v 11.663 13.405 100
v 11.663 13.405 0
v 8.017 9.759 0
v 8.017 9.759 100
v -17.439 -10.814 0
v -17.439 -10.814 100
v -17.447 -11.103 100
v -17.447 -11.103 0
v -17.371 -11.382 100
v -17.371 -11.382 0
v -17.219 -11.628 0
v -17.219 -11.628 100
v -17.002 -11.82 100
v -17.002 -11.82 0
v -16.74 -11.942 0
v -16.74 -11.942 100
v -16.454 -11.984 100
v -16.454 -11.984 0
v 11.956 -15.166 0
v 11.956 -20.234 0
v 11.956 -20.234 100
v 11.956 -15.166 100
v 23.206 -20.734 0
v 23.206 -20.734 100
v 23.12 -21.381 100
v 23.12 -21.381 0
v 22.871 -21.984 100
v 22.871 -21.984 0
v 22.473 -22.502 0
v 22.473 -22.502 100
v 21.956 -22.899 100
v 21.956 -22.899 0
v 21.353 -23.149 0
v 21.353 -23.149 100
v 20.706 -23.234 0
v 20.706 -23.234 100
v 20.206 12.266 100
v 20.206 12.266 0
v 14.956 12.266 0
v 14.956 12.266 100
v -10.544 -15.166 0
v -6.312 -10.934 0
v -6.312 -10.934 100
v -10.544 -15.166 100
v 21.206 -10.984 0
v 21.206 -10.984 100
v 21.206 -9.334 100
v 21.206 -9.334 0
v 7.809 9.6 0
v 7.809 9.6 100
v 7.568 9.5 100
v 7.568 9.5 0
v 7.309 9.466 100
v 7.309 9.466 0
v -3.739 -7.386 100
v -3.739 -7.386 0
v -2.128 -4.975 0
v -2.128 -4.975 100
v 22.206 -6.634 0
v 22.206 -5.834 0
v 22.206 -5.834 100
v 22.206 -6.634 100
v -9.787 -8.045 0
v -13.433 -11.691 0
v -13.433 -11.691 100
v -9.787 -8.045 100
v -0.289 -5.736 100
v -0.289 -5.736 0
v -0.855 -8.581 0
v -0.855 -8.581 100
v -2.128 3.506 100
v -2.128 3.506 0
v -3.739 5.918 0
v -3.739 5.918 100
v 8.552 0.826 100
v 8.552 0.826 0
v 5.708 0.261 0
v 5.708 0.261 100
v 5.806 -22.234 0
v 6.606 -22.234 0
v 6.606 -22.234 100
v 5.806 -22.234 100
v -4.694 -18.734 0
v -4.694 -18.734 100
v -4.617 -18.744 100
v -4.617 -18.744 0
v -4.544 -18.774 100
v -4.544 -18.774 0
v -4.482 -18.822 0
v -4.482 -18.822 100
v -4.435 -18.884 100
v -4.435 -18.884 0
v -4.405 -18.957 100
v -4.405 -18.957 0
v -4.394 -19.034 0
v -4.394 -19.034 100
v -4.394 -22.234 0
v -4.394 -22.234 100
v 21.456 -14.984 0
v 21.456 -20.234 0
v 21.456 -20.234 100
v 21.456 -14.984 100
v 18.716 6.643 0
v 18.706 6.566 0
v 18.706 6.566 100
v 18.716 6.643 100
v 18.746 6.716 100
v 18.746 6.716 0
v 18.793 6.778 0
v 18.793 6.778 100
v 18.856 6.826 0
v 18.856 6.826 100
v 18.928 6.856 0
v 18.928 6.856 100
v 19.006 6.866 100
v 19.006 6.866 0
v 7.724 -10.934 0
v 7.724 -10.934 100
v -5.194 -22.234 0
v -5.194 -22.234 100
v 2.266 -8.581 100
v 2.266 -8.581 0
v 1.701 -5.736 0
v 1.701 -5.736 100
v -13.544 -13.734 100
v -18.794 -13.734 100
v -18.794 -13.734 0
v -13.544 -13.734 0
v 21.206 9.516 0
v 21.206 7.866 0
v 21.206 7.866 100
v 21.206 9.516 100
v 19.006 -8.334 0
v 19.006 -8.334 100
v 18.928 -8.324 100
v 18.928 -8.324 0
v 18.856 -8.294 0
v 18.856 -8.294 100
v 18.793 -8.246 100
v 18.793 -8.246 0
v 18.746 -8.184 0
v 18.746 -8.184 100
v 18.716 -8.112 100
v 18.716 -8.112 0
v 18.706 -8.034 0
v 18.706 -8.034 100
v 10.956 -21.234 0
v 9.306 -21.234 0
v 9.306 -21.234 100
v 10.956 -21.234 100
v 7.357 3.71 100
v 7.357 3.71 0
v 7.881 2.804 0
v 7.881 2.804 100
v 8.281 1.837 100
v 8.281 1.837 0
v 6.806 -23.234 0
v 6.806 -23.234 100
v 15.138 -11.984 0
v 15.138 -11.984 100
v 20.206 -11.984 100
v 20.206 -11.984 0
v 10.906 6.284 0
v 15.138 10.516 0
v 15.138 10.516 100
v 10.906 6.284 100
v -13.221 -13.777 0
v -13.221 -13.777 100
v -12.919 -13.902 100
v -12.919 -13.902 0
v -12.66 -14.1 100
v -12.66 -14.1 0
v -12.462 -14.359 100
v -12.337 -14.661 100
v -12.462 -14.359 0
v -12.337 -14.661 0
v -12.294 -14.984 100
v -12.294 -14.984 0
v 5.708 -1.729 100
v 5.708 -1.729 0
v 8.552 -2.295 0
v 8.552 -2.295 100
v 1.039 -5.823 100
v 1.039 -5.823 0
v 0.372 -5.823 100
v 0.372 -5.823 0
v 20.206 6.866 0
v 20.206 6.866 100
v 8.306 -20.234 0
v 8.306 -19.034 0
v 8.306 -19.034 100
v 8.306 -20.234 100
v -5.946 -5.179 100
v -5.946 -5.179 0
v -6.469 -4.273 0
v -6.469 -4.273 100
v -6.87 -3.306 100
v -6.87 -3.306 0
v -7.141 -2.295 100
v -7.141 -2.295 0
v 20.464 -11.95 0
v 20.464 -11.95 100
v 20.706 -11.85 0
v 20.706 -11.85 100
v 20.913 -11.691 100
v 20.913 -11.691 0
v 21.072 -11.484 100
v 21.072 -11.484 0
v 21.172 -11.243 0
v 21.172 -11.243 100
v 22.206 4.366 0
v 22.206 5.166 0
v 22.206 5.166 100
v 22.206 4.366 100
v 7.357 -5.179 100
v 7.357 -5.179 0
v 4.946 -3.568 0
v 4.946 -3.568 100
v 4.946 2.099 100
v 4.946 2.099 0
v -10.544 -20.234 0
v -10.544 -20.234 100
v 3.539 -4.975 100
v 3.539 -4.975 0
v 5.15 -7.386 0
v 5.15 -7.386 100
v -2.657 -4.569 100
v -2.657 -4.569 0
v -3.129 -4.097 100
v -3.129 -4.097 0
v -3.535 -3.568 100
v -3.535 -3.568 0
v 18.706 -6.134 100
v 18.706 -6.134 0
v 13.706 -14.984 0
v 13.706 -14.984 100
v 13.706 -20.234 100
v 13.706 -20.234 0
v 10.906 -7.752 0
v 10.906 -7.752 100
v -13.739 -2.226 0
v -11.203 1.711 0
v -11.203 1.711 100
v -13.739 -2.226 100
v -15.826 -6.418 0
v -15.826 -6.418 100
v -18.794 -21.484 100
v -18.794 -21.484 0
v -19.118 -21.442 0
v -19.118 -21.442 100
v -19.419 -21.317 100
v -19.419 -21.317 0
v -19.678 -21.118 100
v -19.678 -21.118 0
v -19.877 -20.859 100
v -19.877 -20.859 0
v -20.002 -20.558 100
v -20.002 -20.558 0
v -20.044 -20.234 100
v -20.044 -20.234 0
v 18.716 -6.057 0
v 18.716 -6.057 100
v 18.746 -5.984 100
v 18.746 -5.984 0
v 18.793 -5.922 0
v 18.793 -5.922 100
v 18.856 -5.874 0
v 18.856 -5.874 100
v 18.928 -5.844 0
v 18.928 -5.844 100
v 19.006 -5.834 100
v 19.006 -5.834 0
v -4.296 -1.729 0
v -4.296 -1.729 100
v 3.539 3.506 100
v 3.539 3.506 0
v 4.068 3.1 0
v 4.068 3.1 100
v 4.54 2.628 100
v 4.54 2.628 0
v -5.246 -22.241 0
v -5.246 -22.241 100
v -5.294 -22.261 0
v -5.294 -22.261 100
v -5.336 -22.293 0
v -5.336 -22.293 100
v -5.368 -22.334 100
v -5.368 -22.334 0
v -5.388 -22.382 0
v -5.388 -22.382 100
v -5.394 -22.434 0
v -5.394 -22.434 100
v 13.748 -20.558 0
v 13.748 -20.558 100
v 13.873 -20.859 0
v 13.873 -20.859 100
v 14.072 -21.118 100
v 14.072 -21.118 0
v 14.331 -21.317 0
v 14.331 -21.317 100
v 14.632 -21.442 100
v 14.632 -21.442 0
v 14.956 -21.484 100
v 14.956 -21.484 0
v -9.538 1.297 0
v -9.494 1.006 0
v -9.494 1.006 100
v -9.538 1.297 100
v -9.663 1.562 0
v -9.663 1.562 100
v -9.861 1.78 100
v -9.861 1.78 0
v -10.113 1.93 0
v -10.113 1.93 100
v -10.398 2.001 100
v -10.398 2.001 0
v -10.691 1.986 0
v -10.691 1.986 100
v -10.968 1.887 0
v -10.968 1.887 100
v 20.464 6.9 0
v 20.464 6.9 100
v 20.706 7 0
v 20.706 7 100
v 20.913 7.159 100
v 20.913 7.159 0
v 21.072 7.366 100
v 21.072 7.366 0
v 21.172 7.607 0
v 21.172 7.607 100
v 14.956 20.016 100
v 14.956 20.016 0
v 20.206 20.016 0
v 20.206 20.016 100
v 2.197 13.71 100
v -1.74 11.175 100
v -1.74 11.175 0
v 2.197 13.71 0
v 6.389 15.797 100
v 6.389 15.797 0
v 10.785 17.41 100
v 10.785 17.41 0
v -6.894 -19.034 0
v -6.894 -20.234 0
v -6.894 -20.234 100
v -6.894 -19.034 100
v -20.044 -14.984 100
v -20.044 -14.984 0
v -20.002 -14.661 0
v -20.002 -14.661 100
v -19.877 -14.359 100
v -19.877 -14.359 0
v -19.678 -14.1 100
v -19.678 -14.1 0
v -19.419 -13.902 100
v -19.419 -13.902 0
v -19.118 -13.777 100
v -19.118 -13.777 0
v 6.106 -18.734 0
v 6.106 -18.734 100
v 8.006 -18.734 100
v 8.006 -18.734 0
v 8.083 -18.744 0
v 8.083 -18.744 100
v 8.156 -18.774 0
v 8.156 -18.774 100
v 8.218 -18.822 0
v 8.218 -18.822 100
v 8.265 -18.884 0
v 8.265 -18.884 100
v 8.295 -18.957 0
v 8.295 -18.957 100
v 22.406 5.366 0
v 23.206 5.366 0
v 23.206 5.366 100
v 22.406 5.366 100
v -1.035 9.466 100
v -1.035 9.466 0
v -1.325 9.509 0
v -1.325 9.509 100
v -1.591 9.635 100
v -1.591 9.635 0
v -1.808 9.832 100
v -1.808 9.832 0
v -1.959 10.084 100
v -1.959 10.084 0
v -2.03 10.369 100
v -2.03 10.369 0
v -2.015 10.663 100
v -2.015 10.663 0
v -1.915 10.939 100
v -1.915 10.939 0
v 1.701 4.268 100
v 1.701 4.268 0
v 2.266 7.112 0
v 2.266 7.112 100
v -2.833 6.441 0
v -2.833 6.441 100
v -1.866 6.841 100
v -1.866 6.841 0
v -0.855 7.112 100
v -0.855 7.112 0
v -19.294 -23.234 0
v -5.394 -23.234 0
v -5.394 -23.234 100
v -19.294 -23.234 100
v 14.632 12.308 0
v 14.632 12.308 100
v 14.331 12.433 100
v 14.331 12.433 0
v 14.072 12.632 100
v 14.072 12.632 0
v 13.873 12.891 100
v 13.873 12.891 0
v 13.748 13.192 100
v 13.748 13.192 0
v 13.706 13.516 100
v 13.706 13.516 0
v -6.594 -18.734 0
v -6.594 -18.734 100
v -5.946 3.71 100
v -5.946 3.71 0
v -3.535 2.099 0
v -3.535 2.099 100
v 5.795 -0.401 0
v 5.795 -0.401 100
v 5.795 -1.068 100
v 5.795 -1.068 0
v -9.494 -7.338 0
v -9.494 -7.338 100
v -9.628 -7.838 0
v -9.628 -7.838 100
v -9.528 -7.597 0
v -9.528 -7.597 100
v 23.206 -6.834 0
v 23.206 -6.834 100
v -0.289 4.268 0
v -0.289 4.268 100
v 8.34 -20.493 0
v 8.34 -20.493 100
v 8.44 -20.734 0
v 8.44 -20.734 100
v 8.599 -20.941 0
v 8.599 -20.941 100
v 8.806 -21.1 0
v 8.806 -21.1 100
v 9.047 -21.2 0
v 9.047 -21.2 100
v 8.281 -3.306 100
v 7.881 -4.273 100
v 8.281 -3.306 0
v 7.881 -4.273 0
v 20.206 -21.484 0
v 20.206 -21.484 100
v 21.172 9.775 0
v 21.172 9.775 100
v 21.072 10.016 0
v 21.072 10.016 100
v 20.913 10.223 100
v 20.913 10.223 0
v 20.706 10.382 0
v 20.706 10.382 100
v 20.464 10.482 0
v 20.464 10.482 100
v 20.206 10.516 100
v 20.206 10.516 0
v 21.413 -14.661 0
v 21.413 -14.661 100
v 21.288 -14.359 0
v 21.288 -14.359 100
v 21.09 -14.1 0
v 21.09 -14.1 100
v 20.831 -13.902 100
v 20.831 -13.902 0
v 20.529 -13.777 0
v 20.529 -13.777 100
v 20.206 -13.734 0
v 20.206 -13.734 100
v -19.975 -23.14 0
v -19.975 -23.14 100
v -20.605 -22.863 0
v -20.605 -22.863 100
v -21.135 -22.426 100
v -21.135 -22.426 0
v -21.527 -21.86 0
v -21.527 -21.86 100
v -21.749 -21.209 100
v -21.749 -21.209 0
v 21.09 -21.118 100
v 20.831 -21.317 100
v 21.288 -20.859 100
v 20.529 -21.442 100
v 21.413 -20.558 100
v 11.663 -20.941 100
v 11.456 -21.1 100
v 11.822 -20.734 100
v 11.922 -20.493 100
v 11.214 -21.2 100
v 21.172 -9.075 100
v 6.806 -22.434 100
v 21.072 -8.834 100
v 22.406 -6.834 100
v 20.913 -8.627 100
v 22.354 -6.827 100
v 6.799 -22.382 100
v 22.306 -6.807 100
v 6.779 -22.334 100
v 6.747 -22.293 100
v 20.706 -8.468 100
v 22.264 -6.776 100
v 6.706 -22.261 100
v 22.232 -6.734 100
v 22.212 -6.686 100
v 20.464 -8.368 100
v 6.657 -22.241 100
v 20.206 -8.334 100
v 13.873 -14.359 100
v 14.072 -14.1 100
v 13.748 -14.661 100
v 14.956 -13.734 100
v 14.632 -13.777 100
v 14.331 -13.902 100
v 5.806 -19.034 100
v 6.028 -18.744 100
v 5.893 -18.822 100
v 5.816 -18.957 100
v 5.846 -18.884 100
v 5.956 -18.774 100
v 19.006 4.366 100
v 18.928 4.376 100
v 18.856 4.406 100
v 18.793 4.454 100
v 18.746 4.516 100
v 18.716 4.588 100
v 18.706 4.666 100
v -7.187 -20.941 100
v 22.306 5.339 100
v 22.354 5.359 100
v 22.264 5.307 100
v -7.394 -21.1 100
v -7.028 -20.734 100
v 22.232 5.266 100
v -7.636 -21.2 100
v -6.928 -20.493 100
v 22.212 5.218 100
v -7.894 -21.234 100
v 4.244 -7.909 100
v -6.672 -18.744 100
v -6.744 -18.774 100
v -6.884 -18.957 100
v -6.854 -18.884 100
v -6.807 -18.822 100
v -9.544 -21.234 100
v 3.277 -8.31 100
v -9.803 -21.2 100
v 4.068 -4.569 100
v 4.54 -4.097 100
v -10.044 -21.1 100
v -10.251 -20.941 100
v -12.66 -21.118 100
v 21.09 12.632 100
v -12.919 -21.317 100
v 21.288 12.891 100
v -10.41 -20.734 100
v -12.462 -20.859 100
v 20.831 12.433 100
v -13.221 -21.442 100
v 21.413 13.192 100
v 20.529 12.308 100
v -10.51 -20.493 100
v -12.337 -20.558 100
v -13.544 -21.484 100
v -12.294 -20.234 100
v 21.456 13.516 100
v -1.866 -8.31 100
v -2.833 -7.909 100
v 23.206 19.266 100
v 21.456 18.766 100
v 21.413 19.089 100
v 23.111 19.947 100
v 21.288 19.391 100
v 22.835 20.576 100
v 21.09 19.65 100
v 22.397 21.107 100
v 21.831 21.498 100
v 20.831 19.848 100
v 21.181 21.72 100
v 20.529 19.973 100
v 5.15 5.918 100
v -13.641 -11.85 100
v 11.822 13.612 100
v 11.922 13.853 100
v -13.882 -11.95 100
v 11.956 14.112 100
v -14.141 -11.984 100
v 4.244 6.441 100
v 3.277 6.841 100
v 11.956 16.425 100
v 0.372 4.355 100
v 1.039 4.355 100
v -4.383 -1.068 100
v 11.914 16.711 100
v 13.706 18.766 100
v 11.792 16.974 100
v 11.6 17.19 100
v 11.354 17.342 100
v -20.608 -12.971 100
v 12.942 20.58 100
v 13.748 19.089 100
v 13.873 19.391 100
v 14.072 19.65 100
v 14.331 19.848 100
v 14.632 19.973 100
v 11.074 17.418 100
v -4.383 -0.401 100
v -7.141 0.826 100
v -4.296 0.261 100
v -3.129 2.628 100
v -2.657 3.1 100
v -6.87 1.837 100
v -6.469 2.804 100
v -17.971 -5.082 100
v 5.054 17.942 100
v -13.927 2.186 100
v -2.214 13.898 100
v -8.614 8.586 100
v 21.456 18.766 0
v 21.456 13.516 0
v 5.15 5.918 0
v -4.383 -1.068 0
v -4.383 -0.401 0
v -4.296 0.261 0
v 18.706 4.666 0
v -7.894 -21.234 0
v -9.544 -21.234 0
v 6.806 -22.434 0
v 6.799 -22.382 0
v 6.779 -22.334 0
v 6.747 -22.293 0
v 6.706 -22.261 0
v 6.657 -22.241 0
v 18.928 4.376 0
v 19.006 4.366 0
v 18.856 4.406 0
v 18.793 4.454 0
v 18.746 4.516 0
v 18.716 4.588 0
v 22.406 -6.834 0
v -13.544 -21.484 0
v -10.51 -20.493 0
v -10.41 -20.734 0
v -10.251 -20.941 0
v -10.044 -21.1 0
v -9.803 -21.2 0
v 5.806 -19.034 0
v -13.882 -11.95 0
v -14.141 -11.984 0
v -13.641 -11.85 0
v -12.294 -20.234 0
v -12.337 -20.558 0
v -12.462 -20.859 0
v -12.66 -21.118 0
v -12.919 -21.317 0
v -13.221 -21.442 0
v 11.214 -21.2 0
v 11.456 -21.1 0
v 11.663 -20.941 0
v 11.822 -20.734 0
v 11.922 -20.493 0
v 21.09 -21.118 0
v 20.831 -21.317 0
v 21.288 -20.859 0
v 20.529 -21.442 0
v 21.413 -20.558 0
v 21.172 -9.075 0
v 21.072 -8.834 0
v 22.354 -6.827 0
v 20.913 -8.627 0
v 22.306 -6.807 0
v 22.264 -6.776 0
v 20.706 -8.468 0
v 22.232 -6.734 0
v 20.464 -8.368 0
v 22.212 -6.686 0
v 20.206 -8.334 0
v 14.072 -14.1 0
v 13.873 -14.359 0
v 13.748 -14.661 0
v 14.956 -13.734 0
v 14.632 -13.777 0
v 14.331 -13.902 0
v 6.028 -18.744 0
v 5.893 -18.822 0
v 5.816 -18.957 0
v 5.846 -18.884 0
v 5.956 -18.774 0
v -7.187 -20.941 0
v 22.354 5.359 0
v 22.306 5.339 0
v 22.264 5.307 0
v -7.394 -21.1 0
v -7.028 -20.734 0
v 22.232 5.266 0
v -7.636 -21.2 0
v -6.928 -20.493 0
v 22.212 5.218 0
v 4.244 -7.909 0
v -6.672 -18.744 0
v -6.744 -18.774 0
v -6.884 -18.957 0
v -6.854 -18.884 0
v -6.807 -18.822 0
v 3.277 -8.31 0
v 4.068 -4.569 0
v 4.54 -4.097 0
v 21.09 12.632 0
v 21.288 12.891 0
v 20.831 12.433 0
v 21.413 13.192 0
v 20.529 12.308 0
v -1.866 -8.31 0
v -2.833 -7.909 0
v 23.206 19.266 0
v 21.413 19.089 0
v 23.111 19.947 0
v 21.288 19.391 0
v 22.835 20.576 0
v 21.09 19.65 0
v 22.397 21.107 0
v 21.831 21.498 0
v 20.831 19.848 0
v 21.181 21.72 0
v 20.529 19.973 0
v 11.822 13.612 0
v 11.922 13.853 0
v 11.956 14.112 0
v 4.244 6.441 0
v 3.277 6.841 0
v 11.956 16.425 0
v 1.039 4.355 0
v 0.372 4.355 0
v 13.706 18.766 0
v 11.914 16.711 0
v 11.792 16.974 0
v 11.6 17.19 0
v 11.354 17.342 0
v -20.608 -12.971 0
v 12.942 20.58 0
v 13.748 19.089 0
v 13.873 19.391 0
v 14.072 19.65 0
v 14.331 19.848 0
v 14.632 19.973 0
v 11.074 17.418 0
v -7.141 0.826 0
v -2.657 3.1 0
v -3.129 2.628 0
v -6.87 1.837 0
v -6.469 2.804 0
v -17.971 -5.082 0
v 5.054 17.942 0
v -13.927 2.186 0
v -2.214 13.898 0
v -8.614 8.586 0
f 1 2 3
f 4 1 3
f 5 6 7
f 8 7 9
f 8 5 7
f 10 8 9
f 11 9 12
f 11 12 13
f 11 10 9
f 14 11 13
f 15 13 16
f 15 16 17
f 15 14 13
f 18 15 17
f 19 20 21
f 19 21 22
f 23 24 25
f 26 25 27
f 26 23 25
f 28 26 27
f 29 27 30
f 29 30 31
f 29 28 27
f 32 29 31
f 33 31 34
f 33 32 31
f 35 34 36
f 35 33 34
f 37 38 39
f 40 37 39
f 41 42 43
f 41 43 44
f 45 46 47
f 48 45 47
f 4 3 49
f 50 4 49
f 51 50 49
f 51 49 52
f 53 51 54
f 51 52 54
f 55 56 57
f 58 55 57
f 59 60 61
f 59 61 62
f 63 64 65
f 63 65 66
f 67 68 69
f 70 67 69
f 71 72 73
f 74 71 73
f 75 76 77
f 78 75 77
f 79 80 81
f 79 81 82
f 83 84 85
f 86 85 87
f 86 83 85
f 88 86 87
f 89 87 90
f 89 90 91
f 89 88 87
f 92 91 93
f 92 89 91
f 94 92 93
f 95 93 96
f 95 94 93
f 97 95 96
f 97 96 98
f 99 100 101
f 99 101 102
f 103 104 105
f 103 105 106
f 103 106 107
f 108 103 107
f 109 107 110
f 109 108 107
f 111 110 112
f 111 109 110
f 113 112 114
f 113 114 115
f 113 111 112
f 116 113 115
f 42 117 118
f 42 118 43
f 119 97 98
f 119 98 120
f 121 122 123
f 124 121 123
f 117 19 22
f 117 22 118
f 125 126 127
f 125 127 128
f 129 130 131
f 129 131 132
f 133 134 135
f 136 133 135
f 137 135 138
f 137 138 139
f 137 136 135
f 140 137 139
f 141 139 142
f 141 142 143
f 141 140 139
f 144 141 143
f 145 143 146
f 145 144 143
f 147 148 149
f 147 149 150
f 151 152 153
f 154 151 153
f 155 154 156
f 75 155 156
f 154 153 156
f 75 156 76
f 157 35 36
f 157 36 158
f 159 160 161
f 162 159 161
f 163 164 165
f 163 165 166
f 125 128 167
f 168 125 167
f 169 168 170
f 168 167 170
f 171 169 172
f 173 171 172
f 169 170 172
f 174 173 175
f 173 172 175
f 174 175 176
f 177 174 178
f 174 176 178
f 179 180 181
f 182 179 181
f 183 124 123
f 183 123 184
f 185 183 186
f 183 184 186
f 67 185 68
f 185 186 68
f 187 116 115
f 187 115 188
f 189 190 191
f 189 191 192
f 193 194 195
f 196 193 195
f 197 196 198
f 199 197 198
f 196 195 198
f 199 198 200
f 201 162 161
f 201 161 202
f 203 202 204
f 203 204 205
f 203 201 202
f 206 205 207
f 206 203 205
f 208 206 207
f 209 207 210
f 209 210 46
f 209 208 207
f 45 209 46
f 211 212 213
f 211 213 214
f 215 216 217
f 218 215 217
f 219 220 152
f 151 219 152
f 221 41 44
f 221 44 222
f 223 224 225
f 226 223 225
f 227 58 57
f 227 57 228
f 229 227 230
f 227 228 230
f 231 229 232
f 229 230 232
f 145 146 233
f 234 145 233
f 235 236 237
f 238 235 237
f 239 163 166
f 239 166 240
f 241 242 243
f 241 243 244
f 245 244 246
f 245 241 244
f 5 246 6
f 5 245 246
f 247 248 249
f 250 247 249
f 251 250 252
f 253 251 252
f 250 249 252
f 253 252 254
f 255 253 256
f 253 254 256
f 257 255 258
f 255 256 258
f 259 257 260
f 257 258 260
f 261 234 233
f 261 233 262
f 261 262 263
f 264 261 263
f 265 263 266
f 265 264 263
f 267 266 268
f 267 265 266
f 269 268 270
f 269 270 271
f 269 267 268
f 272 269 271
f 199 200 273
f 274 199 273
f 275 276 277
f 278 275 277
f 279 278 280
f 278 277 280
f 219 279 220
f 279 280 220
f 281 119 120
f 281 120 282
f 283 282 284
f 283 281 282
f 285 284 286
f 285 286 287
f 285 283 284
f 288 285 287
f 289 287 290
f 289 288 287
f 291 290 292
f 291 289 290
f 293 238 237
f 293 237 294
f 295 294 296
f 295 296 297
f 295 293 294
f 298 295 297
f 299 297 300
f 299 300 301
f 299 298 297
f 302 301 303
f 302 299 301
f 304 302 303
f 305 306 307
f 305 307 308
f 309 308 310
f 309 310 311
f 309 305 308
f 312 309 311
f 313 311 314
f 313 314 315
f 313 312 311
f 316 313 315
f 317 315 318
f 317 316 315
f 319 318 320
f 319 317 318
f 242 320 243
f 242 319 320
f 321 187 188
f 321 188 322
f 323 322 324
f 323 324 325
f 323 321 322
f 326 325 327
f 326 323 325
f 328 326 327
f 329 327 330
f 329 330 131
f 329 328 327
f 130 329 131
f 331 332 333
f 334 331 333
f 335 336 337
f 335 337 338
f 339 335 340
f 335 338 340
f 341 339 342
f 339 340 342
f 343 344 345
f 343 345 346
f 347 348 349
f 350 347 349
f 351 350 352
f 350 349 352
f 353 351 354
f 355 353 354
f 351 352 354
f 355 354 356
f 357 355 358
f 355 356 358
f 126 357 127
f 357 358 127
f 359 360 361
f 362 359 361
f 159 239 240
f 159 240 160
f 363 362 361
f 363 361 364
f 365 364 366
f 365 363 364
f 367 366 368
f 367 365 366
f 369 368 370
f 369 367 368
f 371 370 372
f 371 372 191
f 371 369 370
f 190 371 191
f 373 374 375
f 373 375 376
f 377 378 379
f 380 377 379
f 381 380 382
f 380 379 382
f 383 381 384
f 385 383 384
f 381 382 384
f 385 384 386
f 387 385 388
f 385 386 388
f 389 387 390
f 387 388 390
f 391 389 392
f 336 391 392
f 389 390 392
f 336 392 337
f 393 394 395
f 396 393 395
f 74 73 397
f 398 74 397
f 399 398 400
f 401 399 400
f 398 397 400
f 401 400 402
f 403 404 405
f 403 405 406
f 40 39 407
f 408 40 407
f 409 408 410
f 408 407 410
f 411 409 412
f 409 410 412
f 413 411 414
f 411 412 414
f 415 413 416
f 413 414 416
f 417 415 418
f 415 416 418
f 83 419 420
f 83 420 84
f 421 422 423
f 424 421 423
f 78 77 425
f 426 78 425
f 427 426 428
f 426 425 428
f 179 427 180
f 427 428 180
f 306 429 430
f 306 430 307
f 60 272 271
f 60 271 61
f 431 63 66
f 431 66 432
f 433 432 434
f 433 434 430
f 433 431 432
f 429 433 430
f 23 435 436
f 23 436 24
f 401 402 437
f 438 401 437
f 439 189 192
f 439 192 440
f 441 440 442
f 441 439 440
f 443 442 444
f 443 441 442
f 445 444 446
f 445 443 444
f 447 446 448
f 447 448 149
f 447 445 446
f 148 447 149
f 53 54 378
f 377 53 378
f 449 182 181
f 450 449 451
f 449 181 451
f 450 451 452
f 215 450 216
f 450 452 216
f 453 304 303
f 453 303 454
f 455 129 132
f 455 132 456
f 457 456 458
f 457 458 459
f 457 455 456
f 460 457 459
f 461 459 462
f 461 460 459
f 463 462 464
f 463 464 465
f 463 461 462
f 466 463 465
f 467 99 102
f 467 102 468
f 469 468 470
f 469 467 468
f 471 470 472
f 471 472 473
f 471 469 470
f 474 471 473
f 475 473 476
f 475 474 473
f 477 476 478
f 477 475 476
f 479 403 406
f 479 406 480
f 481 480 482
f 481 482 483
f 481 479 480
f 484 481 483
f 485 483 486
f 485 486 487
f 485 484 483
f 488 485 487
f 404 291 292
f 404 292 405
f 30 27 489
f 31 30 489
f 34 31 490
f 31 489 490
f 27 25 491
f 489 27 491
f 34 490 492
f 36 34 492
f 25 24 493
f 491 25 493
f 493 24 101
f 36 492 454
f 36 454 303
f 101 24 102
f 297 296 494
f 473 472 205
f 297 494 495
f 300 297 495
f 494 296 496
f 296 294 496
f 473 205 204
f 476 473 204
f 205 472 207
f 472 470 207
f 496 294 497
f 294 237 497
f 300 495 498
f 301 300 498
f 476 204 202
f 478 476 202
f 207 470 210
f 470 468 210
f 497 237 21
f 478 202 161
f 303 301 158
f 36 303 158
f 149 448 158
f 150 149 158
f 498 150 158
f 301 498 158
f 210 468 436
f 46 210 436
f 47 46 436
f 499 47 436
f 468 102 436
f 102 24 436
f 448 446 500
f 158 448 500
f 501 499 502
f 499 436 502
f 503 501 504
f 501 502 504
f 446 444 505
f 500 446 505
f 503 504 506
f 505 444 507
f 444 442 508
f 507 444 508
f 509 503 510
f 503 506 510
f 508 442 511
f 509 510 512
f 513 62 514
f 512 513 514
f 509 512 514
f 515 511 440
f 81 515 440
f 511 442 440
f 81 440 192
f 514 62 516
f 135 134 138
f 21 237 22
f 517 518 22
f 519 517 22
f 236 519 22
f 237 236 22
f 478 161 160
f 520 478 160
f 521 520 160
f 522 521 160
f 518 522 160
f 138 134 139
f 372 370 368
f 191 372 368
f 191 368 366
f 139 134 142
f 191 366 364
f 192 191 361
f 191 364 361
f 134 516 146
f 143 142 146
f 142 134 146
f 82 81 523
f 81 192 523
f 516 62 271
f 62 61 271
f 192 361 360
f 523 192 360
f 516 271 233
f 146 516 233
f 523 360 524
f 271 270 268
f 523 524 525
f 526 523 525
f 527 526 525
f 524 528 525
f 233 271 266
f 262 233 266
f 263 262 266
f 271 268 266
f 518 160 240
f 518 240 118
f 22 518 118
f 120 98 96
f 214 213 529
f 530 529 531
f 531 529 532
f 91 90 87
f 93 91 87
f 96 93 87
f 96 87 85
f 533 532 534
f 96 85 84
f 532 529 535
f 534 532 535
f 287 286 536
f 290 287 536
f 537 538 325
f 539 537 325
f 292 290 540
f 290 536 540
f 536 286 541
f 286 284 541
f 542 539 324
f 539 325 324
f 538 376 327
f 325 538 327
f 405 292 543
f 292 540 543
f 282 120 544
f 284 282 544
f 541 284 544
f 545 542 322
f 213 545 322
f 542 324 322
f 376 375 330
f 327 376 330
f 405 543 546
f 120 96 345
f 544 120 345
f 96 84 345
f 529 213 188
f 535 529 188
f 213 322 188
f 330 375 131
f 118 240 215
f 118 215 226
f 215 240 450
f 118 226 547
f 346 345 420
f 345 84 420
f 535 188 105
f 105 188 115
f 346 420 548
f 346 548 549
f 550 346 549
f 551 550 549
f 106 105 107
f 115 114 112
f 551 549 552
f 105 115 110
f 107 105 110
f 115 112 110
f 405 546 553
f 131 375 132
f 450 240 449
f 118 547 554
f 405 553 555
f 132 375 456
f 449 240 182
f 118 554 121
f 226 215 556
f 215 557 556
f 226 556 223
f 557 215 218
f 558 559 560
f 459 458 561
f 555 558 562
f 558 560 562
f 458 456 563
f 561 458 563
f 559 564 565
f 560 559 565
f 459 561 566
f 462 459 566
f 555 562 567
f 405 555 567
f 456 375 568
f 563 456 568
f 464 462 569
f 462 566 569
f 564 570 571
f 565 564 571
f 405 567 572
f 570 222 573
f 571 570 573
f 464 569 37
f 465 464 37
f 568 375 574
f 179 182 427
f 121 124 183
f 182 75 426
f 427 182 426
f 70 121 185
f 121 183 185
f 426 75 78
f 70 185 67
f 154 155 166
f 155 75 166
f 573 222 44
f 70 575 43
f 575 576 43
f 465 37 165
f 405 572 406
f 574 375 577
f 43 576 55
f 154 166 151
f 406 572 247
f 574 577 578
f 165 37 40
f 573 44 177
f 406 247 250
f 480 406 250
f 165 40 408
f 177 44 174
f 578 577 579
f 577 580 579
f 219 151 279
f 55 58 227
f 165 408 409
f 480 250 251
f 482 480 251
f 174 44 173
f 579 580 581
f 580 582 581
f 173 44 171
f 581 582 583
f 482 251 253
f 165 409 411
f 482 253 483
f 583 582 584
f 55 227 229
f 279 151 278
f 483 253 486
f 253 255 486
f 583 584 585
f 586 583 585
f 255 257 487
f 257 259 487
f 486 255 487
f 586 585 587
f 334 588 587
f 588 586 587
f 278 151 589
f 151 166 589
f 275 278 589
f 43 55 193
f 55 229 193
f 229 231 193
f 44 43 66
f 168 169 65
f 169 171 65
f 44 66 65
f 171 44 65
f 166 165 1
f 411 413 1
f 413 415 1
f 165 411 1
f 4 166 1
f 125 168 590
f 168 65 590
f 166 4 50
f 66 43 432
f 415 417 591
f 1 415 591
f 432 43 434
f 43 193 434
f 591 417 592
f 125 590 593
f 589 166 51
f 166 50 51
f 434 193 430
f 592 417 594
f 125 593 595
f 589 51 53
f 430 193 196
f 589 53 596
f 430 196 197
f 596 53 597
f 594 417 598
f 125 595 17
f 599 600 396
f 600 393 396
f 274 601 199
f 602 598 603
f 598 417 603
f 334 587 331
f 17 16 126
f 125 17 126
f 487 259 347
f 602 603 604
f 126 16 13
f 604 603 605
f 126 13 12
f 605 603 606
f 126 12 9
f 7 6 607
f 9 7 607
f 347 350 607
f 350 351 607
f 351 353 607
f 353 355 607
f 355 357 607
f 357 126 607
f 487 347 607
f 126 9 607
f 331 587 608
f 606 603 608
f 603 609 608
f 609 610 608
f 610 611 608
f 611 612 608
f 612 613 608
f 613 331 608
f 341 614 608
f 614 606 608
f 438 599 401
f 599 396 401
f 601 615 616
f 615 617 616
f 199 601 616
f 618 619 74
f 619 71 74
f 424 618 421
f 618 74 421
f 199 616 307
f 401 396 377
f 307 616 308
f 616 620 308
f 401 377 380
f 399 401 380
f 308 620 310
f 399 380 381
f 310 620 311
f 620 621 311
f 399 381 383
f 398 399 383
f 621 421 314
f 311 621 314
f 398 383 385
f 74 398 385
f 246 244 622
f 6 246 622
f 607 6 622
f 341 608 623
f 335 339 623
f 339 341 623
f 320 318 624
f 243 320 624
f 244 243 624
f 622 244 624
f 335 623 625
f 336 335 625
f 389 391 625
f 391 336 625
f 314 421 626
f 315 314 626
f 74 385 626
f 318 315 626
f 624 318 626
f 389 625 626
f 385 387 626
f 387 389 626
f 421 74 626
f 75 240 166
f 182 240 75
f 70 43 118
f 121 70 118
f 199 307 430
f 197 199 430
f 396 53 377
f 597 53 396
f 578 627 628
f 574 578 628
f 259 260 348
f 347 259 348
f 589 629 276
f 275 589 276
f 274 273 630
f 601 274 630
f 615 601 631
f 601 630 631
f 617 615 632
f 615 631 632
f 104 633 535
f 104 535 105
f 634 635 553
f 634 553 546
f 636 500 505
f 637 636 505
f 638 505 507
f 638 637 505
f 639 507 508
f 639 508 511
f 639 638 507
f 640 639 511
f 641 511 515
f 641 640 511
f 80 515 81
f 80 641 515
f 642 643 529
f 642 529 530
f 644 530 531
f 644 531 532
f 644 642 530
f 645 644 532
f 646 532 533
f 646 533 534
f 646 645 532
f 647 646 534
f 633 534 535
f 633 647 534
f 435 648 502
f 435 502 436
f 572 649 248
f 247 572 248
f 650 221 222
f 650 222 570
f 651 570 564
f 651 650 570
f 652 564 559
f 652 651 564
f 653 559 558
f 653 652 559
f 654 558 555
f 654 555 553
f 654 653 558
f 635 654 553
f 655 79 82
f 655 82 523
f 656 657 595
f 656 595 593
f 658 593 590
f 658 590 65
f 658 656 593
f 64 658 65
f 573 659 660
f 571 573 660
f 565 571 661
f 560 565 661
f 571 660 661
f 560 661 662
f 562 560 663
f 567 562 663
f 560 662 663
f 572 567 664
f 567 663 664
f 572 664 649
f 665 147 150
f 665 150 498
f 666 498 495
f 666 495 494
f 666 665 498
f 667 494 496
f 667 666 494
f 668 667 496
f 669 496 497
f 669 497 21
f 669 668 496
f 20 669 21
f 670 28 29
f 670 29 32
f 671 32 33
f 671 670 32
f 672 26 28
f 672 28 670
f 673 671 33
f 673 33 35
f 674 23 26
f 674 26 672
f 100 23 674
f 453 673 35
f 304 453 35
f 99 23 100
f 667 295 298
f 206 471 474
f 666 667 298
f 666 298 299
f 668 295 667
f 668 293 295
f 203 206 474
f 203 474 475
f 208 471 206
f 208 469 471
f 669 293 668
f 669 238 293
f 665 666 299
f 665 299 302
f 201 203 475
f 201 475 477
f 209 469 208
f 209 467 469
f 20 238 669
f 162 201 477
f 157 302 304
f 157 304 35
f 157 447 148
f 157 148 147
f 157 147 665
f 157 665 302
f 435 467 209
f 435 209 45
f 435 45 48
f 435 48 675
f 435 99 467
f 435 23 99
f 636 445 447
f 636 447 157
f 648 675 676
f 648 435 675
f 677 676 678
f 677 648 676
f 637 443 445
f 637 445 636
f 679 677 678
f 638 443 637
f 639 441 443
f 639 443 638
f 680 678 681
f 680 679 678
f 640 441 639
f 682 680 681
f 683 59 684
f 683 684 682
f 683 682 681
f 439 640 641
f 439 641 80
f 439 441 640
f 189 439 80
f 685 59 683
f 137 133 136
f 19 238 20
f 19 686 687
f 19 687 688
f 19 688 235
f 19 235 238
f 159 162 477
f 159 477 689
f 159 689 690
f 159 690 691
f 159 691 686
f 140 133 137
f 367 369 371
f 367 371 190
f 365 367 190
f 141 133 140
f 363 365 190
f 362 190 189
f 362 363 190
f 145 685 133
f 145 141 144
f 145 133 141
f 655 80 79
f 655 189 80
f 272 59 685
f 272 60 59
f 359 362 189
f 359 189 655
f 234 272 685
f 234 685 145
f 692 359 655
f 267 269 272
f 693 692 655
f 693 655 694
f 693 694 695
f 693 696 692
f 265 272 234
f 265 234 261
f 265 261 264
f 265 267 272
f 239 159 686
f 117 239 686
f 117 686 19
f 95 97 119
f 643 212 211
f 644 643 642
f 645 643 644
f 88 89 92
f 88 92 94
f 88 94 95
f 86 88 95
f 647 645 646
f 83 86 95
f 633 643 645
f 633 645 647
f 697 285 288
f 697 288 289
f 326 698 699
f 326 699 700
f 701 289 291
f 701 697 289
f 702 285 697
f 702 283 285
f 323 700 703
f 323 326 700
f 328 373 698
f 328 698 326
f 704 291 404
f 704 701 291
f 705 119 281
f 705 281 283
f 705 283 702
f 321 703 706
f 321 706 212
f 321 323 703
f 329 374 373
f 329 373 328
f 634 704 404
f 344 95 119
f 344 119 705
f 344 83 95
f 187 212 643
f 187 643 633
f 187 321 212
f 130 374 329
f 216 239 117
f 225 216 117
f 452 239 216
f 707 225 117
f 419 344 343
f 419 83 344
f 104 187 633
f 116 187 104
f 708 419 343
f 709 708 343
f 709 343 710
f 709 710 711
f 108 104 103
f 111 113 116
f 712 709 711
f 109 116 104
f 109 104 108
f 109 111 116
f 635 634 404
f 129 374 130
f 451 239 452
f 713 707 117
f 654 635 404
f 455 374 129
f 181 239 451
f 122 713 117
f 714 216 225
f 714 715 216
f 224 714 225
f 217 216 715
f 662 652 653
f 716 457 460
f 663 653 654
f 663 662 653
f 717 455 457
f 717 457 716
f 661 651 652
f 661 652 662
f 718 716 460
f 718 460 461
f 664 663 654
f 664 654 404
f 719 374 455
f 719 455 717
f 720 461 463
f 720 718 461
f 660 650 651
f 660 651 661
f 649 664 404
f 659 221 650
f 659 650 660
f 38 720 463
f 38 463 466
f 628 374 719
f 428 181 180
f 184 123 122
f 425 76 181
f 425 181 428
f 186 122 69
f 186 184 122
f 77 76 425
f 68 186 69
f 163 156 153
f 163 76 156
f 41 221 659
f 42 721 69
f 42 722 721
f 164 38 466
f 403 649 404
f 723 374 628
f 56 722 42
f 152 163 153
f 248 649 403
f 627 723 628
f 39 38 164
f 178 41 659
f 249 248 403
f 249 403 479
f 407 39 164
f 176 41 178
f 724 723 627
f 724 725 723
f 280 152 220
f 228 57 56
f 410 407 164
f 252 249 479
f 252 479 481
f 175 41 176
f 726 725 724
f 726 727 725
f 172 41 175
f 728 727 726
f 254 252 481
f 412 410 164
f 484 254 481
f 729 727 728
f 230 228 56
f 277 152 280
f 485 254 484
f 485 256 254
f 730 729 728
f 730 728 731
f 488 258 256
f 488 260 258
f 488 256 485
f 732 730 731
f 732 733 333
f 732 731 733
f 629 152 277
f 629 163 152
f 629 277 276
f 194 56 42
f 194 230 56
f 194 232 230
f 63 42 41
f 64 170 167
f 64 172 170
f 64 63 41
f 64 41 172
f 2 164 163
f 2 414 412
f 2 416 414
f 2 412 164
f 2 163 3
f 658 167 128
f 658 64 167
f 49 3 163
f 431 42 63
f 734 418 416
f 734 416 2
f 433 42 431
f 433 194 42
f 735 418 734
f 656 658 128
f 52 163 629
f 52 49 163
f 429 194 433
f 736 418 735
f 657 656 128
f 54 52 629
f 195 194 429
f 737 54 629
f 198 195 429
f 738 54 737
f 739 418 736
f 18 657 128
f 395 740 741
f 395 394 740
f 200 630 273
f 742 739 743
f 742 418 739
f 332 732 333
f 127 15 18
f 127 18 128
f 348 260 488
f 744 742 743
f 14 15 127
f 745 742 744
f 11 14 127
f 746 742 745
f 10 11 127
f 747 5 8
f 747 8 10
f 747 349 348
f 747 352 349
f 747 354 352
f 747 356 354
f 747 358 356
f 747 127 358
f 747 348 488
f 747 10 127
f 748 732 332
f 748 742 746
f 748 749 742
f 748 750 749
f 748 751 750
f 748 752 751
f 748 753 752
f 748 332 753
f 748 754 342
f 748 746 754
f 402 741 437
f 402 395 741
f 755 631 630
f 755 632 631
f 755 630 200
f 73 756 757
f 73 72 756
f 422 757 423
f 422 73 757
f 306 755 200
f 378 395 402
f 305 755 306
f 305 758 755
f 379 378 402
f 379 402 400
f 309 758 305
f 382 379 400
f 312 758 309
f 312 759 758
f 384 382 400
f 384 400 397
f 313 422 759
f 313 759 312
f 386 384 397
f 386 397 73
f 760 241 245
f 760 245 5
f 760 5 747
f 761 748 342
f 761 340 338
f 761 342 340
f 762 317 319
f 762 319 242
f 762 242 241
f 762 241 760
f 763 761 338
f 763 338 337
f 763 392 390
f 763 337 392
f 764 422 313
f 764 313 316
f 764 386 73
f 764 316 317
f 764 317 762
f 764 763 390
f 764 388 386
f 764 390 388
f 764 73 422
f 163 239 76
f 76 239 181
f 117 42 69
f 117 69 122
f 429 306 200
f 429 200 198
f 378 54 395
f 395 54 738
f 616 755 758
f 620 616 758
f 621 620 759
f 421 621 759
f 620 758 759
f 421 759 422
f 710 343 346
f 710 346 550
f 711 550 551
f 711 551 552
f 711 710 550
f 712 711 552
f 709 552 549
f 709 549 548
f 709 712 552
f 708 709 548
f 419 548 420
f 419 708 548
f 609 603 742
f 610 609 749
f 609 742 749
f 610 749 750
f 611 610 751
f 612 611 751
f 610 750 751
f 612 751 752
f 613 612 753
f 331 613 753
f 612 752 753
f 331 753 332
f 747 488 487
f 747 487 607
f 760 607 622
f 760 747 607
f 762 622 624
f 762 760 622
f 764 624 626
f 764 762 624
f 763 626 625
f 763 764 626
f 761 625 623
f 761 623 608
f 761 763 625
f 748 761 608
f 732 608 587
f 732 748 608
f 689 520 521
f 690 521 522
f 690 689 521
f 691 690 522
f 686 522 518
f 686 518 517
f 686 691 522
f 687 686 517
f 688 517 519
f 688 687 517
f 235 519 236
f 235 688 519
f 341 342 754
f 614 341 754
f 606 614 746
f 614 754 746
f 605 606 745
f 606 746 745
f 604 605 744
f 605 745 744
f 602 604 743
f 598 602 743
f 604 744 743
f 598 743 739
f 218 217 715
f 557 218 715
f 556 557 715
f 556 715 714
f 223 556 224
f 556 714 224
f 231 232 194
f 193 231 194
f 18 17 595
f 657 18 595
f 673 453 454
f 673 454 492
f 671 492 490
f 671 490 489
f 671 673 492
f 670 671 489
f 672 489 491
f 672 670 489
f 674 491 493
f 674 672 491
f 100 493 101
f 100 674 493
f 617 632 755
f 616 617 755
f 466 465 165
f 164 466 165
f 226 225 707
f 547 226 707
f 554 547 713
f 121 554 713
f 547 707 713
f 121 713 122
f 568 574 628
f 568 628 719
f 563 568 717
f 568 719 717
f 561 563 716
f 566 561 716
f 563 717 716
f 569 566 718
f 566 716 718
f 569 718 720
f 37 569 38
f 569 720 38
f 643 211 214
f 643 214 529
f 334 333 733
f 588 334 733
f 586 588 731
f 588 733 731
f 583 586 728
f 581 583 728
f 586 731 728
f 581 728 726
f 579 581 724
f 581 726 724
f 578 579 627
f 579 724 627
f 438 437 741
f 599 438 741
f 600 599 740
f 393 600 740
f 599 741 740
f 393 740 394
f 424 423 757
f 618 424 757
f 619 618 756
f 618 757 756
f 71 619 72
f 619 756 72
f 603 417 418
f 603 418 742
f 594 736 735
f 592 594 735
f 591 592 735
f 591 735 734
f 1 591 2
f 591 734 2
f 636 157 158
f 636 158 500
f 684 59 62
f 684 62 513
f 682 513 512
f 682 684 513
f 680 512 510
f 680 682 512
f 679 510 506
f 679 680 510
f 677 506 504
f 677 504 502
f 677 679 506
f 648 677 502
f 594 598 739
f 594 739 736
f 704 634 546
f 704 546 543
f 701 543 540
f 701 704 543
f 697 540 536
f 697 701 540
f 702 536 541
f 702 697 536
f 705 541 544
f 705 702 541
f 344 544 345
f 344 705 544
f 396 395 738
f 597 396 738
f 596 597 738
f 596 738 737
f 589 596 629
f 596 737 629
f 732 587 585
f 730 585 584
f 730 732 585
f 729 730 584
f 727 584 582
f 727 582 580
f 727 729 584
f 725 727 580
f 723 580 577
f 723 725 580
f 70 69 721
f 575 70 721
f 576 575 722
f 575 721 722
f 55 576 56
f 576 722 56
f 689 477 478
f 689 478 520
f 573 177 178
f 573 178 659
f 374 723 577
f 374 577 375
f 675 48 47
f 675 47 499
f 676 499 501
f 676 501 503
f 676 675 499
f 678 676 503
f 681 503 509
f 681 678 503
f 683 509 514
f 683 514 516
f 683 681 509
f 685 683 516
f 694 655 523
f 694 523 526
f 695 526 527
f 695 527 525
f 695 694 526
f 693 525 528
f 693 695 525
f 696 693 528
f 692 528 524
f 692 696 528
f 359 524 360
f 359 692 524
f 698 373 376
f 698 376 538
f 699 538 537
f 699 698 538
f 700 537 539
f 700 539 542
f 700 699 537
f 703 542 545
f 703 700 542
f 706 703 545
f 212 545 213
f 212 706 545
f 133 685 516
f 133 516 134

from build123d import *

# Parameters (mm, degrees)
EXTRUDE_1_DEPTH = 100


with BuildPart() as part:
    # 草图1 → 凸台-拉伸1 (new body)
    with BuildSketch(Plane.XY):
        with BuildLine():
            Line((23.205623676, 19.265775848), (23.205623676, 5.365775848))
            Line((23.205623676, 5.365775848), (22.405623676, 5.365775848))
            ThreePointArc((22.405623676, 5.365775848), (22.264202319, 5.307197204), (22.205623676, 5.165775848))
            Line((22.205623676, 5.165775848), (22.205623676, 4.365775848))
            Line((22.205623676, 4.365775848), (19.005623676, 4.365775848))
            ThreePointArc((19.005623676, 4.365775848), (18.793491641, 4.453643813), (18.705623676, 4.665775848))
            Line((18.705623676, 4.665775848), (18.705623676, 6.565775848))
            ThreePointArc((18.705623676, 6.565775848), (18.793491641, 6.777907882), (19.005623676, 6.865775848))
            Line((19.005623676, 6.865775848), (20.205623676, 6.865775848))
            ThreePointArc((20.205623676, 6.865775848), (20.912730457, 7.158669066), (21.205623676, 7.865775848))
            Line((21.205623676, 7.865775848), (21.205623676, 9.515775848))
            ThreePointArc((21.205623676, 9.515775848), (20.912730457, 10.222882629), (20.205623676, 10.515775848))
            Line((20.205623676, 10.515775848), (15.137604191, 10.515775848))
            Line((15.137604191, 10.515775848), (10.905623676, 6.283795332))
            Line((10.905623676, 6.283795332), (10.905623676, -7.752243637))
            Line((10.905623676, -7.752243637), (15.137604191, -11.984224152))
            Line((15.137604191, -11.984224152), (20.205623676, -11.984224152))
            ThreePointArc((20.205623676, -11.984224152), (20.912730457, -11.691330934), (21.205623676, -10.984224152))
            Line((21.205623676, -10.984224152), (21.205623676, -9.334224152))
            ThreePointArc((21.205623676, -9.334224152), (20.912730457, -8.627117371), (20.205623676, -8.334224152))
            Line((20.205623676, -8.334224152), (19.005623676, -8.334224152))
            ThreePointArc((19.005623676, -8.334224152), (18.793491641, -8.246356187), (18.705623676, -8.034224152))
            Line((18.705623676, -8.034224152), (18.705623676, -6.134224152))
            ThreePointArc((18.705623676, -6.134224152), (18.793491641, -5.922092118), (19.005623676, -5.834224152))
            Line((19.005623676, -5.834224152), (22.205623676, -5.834224152))
            Line((22.205623676, -5.834224152), (22.205623676, -6.634224152))
            ThreePointArc((22.205623676, -6.634224152), (22.264202319, -6.775645509), (22.405623676, -6.834224152))
            Line((22.405623676, -6.834224152), (23.205623676, -6.834224152))
            Line((23.205623676, -6.834224152), (23.205623676, -20.734224152))
            ThreePointArc((23.205623676, -20.734224152), (22.473390628, -22.501991105), (20.705623676, -23.234224152))
            Line((20.705623676, -23.234224152), (6.805623676, -23.234224152))
            Line((6.805623676, -23.234224152), (6.805623676, -22.434224152))
            ThreePointArc((6.805623676, -22.434224152), (6.747045032, -22.292802796), (6.605623676, -22.234224152))
            Line((6.605623676, -22.234224152), (5.805623676, -22.234224152))
            Line((5.805623676, -22.234224152), (5.805623676, -19.034224152))
            ThreePointArc((5.805623676, -19.034224152), (5.893491641, -18.822092118), (6.105623676, -18.734224152))
            Line((6.105623676, -18.734224152), (8.005623676, -18.734224152))
            ThreePointArc((8.005623676, -18.734224152), (8.21775571, -18.822092118), (8.305623676, -19.034224152))
            Line((8.305623676, -19.034224152), (8.305623676, -20.234224152))
            ThreePointArc((8.305623676, -20.234224152), (8.598516894, -20.941330934), (9.305623676, -21.234224152))
            Line((9.305623676, -21.234224152), (10.955623676, -21.234224152))
            ThreePointArc((10.955623676, -21.234224152), (11.662730457, -20.941330934), (11.955623676, -20.234224152))
            Line((11.955623676, -20.234224152), (11.955623676, -15.166204668))
            Line((11.955623676, -15.166204668), (7.72364316, -10.934224152))
            Line((7.72364316, -10.934224152), (-6.312395809, -10.934224152))
            Line((-6.312395809, -10.934224152), (-10.544376324, -15.166204668))
            Line((-10.544376324, -15.166204668), (-10.544376324, -20.234224152))
            ThreePointArc((-10.544376324, -20.234224152), (-10.251483106, -20.941330934), (-9.544376324, -21.234224152))
            Line((-9.544376324, -21.234224152), (-7.894376324, -21.234224152))
            ThreePointArc((-7.894376324, -21.234224152), (-7.187269543, -20.941330934), (-6.894376324, -20.234224152))
            Line((-6.894376324, -20.234224152), (-6.894376324, -19.034224152))
            ThreePointArc((-6.894376324, -19.034224152), (-6.806508359, -18.822092118), (-6.594376324, -18.734224152))
            Line((-6.594376324, -18.734224152), (-4.694376324, -18.734224152))
            ThreePointArc((-4.694376324, -18.734224152), (-4.48224429, -18.822092118), (-4.394376324, -19.034224152))
            Line((-4.394376324, -19.034224152), (-4.394376324, -22.234224152))
            Line((-4.394376324, -22.234224152), (-5.194376324, -22.234224152))
            ThreePointArc((-5.194376324, -22.234224152), (-5.335797681, -22.292802796), (-5.394376324, -22.434224152))
            Line((-5.394376324, -22.434224152), (-5.394376324, -23.234224152))
            Line((-5.394376324, -23.234224152), (-19.294376324, -23.234224152))
            ThreePointArc((-19.294376324, -23.234224152), (-20.885291152, -22.66269246), (-21.748799384, -21.209416162))
            ThreePointArc((-21.748799384, -21.209416162), (-8.614181478, 8.585581001), (21.180815685, 21.720198907))
            ThreePointArc((21.180815685, 21.720198907), (22.634091983, 20.856690675), (23.205623676, 19.265775848))
        make_face()
        with BuildLine():
            Line((20.205623676, 12.265775848), (14.955623676, 12.265775848))
            ThreePointArc((14.955623676, 12.265775848), (14.071740199, 12.631892371), (13.705623676, 13.515775848))
            Line((13.705623676, 13.515775848), (13.705623676, 18.765775848))
            ThreePointArc((13.705623676, 18.765775848), (14.071740199, 19.649659324), (14.955623676, 20.015775848))
            Line((14.955623676, 20.015775848), (20.205623676, 20.015775848))
            ThreePointArc((20.205623676, 20.015775848), (21.089507152, 19.649659324), (21.455623676, 18.765775848))
            Line((21.455623676, 18.765775848), (21.455623676, 13.515775848))
            ThreePointArc((21.455623676, 13.515775848), (21.089507152, 12.631892371), (20.205623676, 12.265775848))
        make_face(mode=Mode.SUBTRACT)
        with BuildLine():
            Line((-18.794376324, -13.734224152), (-13.544376324, -13.734224152))
            ThreePointArc((-13.544376324, -13.734224152), (-12.660492848, -14.100340676), (-12.294376324, -14.984224152))
            Line((-12.294376324, -14.984224152), (-12.294376324, -20.234224152))
            ThreePointArc((-12.294376324, -20.234224152), (-12.660492848, -21.118107629), (-13.544376324, -21.484224152))
            Line((-13.544376324, -21.484224152), (-18.794376324, -21.484224152))
            ThreePointArc((-18.794376324, -21.484224152), (-19.678259801, -21.118107629), (-20.044376324, -20.234224152))
            Line((-20.044376324, -20.234224152), (-20.044376324, -14.984224152))
            ThreePointArc((-20.044376324, -14.984224152), (-19.678259801, -14.100340676), (-18.794376324, -13.734224152))
        make_face(mode=Mode.SUBTRACT)
        with BuildLine():
            Line((20.205623676, -13.734224152), (14.955623676, -13.734224152))
            ThreePointArc((14.955623676, -13.734224152), (14.071740199, -14.100340676), (13.705623676, -14.984224152))
            Line((13.705623676, -14.984224152), (13.705623676, -20.234224152))
            ThreePointArc((13.705623676, -20.234224152), (14.071740199, -21.118107629), (14.955623676, -21.484224152))
            Line((14.955623676, -21.484224152), (20.205623676, -21.484224152))
            ThreePointArc((20.205623676, -21.484224152), (21.089507152, -21.118107629), (21.455623676, -20.234224152))
            Line((21.455623676, -20.234224152), (21.455623676, -14.984224152))
            ThreePointArc((21.455623676, -14.984224152), (21.089507152, -14.100340676), (20.205623676, -13.734224152))
        make_face(mode=Mode.SUBTRACT)
        with BuildLine():
            Line((-3.738938189, -7.385981051), (-2.127784513, -4.974719175))
            ThreePointArc((-2.127784513, -4.974719175), (-2.900620909, -4.340468736), (-3.534871347, -3.567632341))
            Line((-3.534871347, -3.567632341), (-5.946133223, -5.178786017))
            ThreePointArc((-5.946133223, -5.178786017), (-6.685412585, -3.795691611), (-7.140658568, -2.294946729))
            Line((-7.140658568, -2.294946729), (-4.296381255, -1.729184795))
            ThreePointArc((-4.296381255, -1.729184795), (-4.394376324, -0.734224152), (-4.296381255, 0.26073649))
            Line((-4.296381255, 0.26073649), (-7.140658568, 0.826498424))
            ThreePointArc((-7.140658568, 0.826498424), (-6.685412585, 2.327243307), (-5.946133223, 3.710337712))
            Line((-5.946133223, 3.710337712), (-3.534871347, 2.099184036))
            ThreePointArc((-3.534871347, 2.099184036), (-2.900620909, 2.872020432), (-2.127784513, 3.50627087))
            Line((-2.127784513, 3.50627087), (-3.738938189, 5.917532746))
            ThreePointArc((-3.738938189, 5.917532746), (-2.355843783, 6.656812108), (-0.855098901, 7.112058091))
            Line((-0.855098901, 7.112058091), (-0.289336967, 4.267780778))
            ThreePointArc((-0.289336967, 4.267780778), (0.705623676, 4.365775848), (1.700584318, 4.267780778))
            Line((1.700584318, 4.267780778), (2.266346252, 7.112058091))
            ThreePointArc((2.266346252, 7.112058091), (3.767091134, 6.656812108), (5.15018554, 5.917532746))
            Line((5.15018554, 5.917532746), (3.539031864, 3.50627087))
            ThreePointArc((3.539031864, 3.50627087), (4.31186826, 2.872020432), (4.946118698, 2.099184036))
            Line((4.946118698, 2.099184036), (7.357380574, 3.710337712))
            ThreePointArc((7.357380574, 3.710337712), (8.096659936, 2.327243307), (8.551905919, 0.826498424))
            Line((8.551905919, 0.826498424), (5.707628606, 0.26073649))
            ThreePointArc((5.707628606, 0.26073649), (5.805623676, -0.734224152), (5.707628606, -1.729184795))
            Line((5.707628606, -1.729184795), (8.551905919, -2.294946729))
            ThreePointArc((8.551905919, -2.294946729), (8.096659936, -3.795691611), (7.357380574, -5.178786017))
            Line((7.357380574, -5.178786017), (4.946118698, -3.567632341))
            ThreePointArc((4.946118698, -3.567632341), (4.31186826, -4.340468736), (3.539031864, -4.974719175))
            Line((3.539031864, -4.974719175), (5.15018554, -7.385981051))
            ThreePointArc((5.15018554, -7.385981051), (3.767091134, -8.125260412), (2.266346252, -8.580506396))
            Line((2.266346252, -8.580506396), (1.700584318, -5.736229082))
            ThreePointArc((1.700584318, -5.736229082), (0.705623676, -5.834224152), (-0.289336967, -5.736229082))
            Line((-0.289336967, -5.736229082), (-0.855098901, -8.580506396))
            ThreePointArc((-0.855098901, -8.580506396), (-2.355843783, -8.125260412), (-3.738938189, -7.385981051))
        make_face(mode=Mode.SUBTRACT)
        with BuildLine():
            Line((11.955623676, 16.425008073), (11.955623676, 14.111969925))
            ThreePointArc((11.955623676, 14.111969925), (11.879503208, 13.729286493), (11.662730457, 13.404863144))
            Line((11.662730457, 13.404863144), (8.016536379, 9.758669066))
            ThreePointArc((8.016536379, 9.758669066), (7.69211303, 9.541896315), (7.309429598, 9.465775848))
            Line((7.309429598, 9.465775848), (-1.034553488, 9.465775848))
            ThreePointArc((-1.034553488, 9.465775848), (-1.95892278, 10.084276945), (-1.739845229, 11.174693022))
            ThreePointArc((-1.739845229, 11.174693022), (4.264338796, 14.811507896), (10.785263601, 17.410389951))
            ThreePointArc((10.785263601, 17.410389951), (11.599688861, 17.189978685), (11.955623676, 16.425008073))
        make_face(mode=Mode.SUBTRACT)
        with BuildLine():
            Line((-16.45360855, -11.984224152), (-14.140570402, -11.984224152))
            ThreePointArc((-14.140570402, -11.984224152), (-13.75788697, -11.908103685), (-13.433463621, -11.691330934))
            Line((-13.433463621, -11.691330934), (-9.787269543, -8.045136856))
            ThreePointArc((-9.787269543, -8.045136856), (-9.570496792, -7.720713507), (-9.494376324, -7.338030075))
            Line((-9.494376324, -7.338030075), (-9.494376324, 1.005953011))
            ThreePointArc((-9.494376324, 1.005953011), (-10.112877422, 1.930322303), (-11.203293499, 1.711244752))
            ThreePointArc((-11.203293499, 1.711244752), (-14.840108373, -4.292939273), (-17.438990428, -10.813864078))
            ThreePointArc((-17.438990428, -10.813864078), (-17.218579162, -11.628289338), (-16.45360855, -11.984224152))
        make_face(mode=Mode.SUBTRACT)
    extrude(amount=EXTRUDE_1_DEPTH)


solid = part.part
